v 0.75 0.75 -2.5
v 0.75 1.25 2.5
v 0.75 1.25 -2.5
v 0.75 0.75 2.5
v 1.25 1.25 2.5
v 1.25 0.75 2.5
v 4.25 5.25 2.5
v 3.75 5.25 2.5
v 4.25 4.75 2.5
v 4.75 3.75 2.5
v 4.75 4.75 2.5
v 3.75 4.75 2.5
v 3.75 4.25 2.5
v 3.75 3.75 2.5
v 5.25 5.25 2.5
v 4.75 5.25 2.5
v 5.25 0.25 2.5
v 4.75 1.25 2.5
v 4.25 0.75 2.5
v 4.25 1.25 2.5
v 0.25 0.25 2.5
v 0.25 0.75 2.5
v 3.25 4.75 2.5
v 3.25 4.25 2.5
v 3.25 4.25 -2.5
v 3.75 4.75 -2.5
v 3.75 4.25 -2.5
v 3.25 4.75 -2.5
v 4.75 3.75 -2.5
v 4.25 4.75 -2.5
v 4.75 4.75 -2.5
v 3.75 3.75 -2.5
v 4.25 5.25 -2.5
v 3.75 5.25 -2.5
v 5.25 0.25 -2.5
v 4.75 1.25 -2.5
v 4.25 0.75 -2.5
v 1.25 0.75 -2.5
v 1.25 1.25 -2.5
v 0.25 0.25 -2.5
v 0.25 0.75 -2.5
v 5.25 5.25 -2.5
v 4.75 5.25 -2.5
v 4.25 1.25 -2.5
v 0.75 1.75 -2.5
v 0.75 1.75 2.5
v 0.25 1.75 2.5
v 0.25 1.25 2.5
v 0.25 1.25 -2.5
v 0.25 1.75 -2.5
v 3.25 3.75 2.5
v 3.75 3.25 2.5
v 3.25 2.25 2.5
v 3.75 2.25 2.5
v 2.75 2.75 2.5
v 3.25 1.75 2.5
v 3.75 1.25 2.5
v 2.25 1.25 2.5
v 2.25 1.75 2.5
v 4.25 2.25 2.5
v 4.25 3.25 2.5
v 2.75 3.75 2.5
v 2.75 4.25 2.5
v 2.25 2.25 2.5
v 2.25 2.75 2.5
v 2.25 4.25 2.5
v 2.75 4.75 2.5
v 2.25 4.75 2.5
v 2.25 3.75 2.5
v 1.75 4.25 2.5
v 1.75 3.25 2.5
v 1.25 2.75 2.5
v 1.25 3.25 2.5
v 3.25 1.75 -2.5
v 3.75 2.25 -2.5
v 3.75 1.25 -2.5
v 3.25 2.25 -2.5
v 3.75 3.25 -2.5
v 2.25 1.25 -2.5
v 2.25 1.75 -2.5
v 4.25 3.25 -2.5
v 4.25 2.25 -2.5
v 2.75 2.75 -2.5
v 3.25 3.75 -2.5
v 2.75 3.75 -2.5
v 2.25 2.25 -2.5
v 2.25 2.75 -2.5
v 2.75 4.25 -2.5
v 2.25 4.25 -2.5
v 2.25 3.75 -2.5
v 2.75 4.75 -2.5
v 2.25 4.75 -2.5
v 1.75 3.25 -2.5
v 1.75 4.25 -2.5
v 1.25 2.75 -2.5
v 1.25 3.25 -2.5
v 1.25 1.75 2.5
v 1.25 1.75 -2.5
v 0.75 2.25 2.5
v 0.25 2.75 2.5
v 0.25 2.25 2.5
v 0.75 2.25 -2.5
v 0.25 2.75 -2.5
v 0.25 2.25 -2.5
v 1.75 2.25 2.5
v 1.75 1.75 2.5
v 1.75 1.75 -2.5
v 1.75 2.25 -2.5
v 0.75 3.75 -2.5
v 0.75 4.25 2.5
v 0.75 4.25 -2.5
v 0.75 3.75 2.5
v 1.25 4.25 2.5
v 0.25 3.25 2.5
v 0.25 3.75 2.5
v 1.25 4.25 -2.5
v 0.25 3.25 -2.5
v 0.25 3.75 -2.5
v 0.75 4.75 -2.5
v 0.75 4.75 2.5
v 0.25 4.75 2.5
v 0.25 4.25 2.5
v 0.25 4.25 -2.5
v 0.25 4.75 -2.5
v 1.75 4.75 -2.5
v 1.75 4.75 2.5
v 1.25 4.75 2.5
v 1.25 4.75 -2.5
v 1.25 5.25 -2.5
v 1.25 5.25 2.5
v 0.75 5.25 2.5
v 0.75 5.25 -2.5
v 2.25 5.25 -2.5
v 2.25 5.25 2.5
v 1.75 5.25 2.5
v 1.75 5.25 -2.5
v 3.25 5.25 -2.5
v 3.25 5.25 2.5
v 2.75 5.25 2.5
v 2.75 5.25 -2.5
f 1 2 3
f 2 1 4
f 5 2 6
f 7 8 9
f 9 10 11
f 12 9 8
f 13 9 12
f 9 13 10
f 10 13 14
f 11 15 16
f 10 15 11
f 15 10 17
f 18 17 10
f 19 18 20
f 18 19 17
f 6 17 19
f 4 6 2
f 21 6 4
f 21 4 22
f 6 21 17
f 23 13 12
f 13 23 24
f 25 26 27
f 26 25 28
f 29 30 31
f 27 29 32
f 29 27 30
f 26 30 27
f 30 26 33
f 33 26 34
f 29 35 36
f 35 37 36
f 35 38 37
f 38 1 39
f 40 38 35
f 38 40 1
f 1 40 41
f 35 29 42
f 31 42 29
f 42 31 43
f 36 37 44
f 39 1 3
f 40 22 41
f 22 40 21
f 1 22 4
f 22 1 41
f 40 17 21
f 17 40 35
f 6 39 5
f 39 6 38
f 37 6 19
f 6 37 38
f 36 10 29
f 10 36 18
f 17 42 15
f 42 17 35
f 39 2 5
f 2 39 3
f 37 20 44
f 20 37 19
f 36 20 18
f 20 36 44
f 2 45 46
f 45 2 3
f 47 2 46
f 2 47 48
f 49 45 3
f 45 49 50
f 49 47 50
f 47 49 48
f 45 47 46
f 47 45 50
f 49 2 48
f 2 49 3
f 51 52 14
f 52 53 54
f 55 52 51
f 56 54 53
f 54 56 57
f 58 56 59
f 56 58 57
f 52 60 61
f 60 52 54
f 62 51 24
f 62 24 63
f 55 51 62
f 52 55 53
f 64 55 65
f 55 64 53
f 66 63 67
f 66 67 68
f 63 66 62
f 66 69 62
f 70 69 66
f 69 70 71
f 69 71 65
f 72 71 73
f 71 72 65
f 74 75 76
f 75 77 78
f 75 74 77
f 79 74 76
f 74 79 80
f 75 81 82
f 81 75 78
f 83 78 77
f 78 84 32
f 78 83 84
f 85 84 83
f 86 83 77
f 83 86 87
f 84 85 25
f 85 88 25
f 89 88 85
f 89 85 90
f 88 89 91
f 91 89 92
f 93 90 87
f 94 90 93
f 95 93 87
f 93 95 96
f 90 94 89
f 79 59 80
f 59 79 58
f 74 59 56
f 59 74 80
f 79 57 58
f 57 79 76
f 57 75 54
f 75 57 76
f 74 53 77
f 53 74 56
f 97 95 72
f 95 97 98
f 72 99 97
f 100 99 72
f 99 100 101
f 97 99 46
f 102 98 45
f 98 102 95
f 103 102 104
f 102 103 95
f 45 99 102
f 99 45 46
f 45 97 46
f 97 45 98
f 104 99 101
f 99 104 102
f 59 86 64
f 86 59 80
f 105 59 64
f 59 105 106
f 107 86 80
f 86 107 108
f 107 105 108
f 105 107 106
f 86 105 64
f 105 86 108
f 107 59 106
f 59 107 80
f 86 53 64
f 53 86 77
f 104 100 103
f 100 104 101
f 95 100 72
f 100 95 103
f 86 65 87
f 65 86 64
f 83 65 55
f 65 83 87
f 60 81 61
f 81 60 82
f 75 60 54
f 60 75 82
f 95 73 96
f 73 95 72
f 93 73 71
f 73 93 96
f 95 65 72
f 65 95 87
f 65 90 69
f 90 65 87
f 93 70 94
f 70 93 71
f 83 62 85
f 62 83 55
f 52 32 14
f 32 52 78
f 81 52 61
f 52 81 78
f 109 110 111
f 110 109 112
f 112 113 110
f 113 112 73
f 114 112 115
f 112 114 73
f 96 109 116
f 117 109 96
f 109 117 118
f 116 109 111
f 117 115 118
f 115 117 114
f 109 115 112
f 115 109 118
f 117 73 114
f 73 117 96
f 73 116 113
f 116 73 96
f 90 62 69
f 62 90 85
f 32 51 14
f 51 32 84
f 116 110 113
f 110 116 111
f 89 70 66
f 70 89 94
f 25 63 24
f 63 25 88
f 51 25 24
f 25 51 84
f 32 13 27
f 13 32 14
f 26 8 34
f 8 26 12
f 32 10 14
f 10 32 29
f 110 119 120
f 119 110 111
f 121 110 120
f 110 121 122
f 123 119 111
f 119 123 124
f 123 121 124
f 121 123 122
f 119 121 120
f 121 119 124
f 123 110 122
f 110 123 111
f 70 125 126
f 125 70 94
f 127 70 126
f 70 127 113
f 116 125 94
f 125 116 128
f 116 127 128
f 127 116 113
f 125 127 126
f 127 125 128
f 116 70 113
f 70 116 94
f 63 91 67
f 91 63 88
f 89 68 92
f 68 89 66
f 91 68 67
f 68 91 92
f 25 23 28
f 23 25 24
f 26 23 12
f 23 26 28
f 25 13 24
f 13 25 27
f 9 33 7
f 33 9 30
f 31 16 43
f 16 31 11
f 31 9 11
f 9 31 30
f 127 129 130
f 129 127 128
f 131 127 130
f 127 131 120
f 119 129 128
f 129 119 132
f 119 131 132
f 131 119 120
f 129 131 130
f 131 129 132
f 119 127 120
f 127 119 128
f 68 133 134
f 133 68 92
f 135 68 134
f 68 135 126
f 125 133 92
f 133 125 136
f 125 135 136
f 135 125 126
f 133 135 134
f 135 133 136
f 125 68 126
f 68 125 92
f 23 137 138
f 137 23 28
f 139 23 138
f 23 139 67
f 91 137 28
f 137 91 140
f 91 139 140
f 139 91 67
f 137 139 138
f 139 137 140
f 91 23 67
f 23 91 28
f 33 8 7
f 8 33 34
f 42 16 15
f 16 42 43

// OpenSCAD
rotate([0,0,0])translate([0,0,0,]){
translate([0.5,0.5,0])  cube(size = [0.5,0.5,5], center=true);
translate([1,0.5,0])  cube(size = [0.5,0.5,5], center=true);
translate([1.5,0.5,0])  cube(size = [0.5,0.5,5], center=true);
translate([2,0.5,0])  cube(size = [0.5,0.5,5], center=true);
translate([2.5,0.5,0])  cube(size = [0.5,0.5,5], center=true);
translate([3,0.5,0])  cube(size = [0.5,0.5,5], center=true);
translate([3.5,0.5,0])  cube(size = [0.5,0.5,5], center=true);
translate([4,0.5,0])  cube(size = [0.5,0.5,5], center=true);
translate([4.5,0.5,0])  cube(size = [0.5,0.5,5], center=true);
translate([5,0.5,0])  cube(size = [0.5,0.5,5], center=true);
translate([5,0.5,0])  cube(size = [0.5,0.5,5], center=true);
translate([1,1,0])  cube(size = [0.5,0.5,5], center=true);
translate([1,1,0])  cube(size = [0.5,0.5,5], center=true);
translate([1,1,0])  cube(size = [0.5,0.5,5], center=true);
translate([1,1,0])  cube(size = [0.5,0.5,5], center=true);
translate([1,1,0])  cube(size = [0.5,0.5,5], center=true);
translate([1,1,0])  cube(size = [0.5,0.5,5], center=true);
translate([1,1,0])  cube(size = [0.5,0.5,5], center=true);
translate([4.5,1,0])  cube(size = [0.5,0.5,5], center=true);
translate([5,1,0])  cube(size = [0.5,0.5,5], center=true);
translate([0.5,1.5,0])  cube(size = [0.5,0.5,5], center=true);
translate([0.5,1.5,0])  cube(size = [0.5,0.5,5], center=true);
translate([0.5,1.5,0])  cube(size = [0.5,0.5,5], center=true);
translate([0.5,1.5,0])  cube(size = [0.5,0.5,5], center=true);
translate([2.5,1.5,0])  cube(size = [0.5,0.5,5], center=true);
translate([3,1.5,0])  cube(size = [0.5,0.5,5], center=true);
translate([3.5,1.5,0])  cube(size = [0.5,0.5,5], center=true);
translate([3.5,1.5,0])  cube(size = [0.5,0.5,5], center=true);
translate([3.5,1.5,0])  cube(size = [0.5,0.5,5], center=true);
translate([5,1.5,0])  cube(size = [0.5,0.5,5], center=true);
translate([5,1.5,0])  cube(size = [0.5,0.5,5], center=true);
translate([1,2,0])  cube(size = [0.5,0.5,5], center=true);
translate([1,2,0])  cube(size = [0.5,0.5,5], center=true);
translate([2,2,0])  cube(size = [0.5,0.5,5], center=true);
translate([2,2,0])  cube(size = [0.5,0.5,5], center=true);
translate([2,2,0])  cube(size = [0.5,0.5,5], center=true);
translate([3.5,2,0])  cube(size = [0.5,0.5,5], center=true);
translate([3.5,2,0])  cube(size = [0.5,0.5,5], center=true);
translate([3.5,2,0])  cube(size = [0.5,0.5,5], center=true);
translate([5,2,0])  cube(size = [0.5,0.5,5], center=true);
translate([0.5,2.5,0])  cube(size = [0.5,0.5,5], center=true);
translate([1,2.5,0])  cube(size = [0.5,0.5,5], center=true);
translate([1,2.5,0])  cube(size = [0.5,0.5,5], center=true);
translate([1,2.5,0])  cube(size = [0.5,0.5,5], center=true);
translate([2.5,2.5,0])  cube(size = [0.5,0.5,5], center=true);
translate([3,2.5,0])  cube(size = [0.5,0.5,5], center=true);
translate([3.5,2.5,0])  cube(size = [0.5,0.5,5], center=true);
translate([4,2.5,0])  cube(size = [0.5,0.5,5], center=true);
translate([4,2.5,0])  cube(size = [0.5,0.5,5], center=true);
translate([5,2.5,0])  cube(size = [0.5,0.5,5], center=true);
translate([5,2.5,0])  cube(size = [0.5,0.5,5], center=true);
translate([5,2.5,0])  cube(size = [0.5,0.5,5], center=true);
translate([1.5,3,0])  cube(size = [0.5,0.5,5], center=true);
translate([2,3,0])  cube(size = [0.5,0.5,5], center=true);
translate([2,3,0])  cube(size = [0.5,0.5,5], center=true);
translate([3,3,0])  cube(size = [0.5,0.5,5], center=true);
translate([3.5,3,0])  cube(size = [0.5,0.5,5], center=true);
translate([4,3,0])  cube(size = [0.5,0.5,5], center=true);
translate([4,3,0])  cube(size = [0.5,0.5,5], center=true);
translate([5,3,0])  cube(size = [0.5,0.5,5], center=true);
translate([0.5,3.5,0])  cube(size = [0.5,0.5,5], center=true);
translate([1,3.5,0])  cube(size = [0.5,0.5,5], center=true);
translate([1,3.5,0])  cube(size = [0.5,0.5,5], center=true);
translate([2,3.5,0])  cube(size = [0.5,0.5,5], center=true);
translate([2,3.5,0])  cube(size = [0.5,0.5,5], center=true);
translate([3,3.5,0])  cube(size = [0.5,0.5,5], center=true);
translate([3.5,3.5,0])  cube(size = [0.5,0.5,5], center=true);
translate([3.5,3.5,0])  cube(size = [0.5,0.5,5], center=true);
translate([3.5,3.5,0])  cube(size = [0.5,0.5,5], center=true);
translate([5,3.5,0])  cube(size = [0.5,0.5,5], center=true);
translate([5,3.5,0])  cube(size = [0.5,0.5,5], center=true);
translate([1,4,0])  cube(size = [0.5,0.5,5], center=true);
translate([1,4,0])  cube(size = [0.5,0.5,5], center=true);
translate([2,4,0])  cube(size = [0.5,0.5,5], center=true);
translate([2.5,4,0])  cube(size = [0.5,0.5,5], center=true);
translate([3,4,0])  cube(size = [0.5,0.5,5], center=true);
translate([3,4,0])  cube(size = [0.5,0.5,5], center=true);
translate([4,4,0])  cube(size = [0.5,0.5,5], center=true);
translate([4.5,4,0])  cube(size = [0.5,0.5,5], center=true);
translate([5,4,0])  cube(size = [0.5,0.5,5], center=true);
translate([0.5,4.5,0])  cube(size = [0.5,0.5,5], center=true);
translate([0.5,4.5,0])  cube(size = [0.5,0.5,5], center=true);
translate([1.5,4.5,0])  cube(size = [0.5,0.5,5], center=true);
translate([1.5,4.5,0])  cube(size = [0.5,0.5,5], center=true);
translate([2.5,4.5,0])  cube(size = [0.5,0.5,5], center=true);
translate([2.5,4.5,0])  cube(size = [0.5,0.5,5], center=true);
translate([3.5,4.5,0])  cube(size = [0.5,0.5,5], center=true);
translate([4,4.5,0])  cube(size = [0.5,0.5,5], center=true);
translate([4.5,4.5,0])  cube(size = [0.5,0.5,5], center=true);
translate([5,4.5,0])  cube(size = [0.5,0.5,5], center=true);
translate([5,4.5,0])  cube(size = [0.5,0.5,5], center=true);
translate([1,5,0])  cube(size = [0.5,0.5,5], center=true);
translate([1,5,0])  cube(size = [0.5,0.5,5], center=true);
translate([2,5,0])  cube(size = [0.5,0.5,5], center=true);
translate([2,5,0])  cube(size = [0.5,0.5,5], center=true);
translate([3,5,0])  cube(size = [0.5,0.5,5], center=true);
translate([3,5,0])  cube(size = [0.5,0.5,5], center=true);
translate([4,5,0])  cube(size = [0.5,0.5,5], center=true);
translate([4,5,0])  cube(size = [0.5,0.5,5], center=true);
translate([5,5,0])  cube(size = [0.5,0.5,5], center=true);
}
